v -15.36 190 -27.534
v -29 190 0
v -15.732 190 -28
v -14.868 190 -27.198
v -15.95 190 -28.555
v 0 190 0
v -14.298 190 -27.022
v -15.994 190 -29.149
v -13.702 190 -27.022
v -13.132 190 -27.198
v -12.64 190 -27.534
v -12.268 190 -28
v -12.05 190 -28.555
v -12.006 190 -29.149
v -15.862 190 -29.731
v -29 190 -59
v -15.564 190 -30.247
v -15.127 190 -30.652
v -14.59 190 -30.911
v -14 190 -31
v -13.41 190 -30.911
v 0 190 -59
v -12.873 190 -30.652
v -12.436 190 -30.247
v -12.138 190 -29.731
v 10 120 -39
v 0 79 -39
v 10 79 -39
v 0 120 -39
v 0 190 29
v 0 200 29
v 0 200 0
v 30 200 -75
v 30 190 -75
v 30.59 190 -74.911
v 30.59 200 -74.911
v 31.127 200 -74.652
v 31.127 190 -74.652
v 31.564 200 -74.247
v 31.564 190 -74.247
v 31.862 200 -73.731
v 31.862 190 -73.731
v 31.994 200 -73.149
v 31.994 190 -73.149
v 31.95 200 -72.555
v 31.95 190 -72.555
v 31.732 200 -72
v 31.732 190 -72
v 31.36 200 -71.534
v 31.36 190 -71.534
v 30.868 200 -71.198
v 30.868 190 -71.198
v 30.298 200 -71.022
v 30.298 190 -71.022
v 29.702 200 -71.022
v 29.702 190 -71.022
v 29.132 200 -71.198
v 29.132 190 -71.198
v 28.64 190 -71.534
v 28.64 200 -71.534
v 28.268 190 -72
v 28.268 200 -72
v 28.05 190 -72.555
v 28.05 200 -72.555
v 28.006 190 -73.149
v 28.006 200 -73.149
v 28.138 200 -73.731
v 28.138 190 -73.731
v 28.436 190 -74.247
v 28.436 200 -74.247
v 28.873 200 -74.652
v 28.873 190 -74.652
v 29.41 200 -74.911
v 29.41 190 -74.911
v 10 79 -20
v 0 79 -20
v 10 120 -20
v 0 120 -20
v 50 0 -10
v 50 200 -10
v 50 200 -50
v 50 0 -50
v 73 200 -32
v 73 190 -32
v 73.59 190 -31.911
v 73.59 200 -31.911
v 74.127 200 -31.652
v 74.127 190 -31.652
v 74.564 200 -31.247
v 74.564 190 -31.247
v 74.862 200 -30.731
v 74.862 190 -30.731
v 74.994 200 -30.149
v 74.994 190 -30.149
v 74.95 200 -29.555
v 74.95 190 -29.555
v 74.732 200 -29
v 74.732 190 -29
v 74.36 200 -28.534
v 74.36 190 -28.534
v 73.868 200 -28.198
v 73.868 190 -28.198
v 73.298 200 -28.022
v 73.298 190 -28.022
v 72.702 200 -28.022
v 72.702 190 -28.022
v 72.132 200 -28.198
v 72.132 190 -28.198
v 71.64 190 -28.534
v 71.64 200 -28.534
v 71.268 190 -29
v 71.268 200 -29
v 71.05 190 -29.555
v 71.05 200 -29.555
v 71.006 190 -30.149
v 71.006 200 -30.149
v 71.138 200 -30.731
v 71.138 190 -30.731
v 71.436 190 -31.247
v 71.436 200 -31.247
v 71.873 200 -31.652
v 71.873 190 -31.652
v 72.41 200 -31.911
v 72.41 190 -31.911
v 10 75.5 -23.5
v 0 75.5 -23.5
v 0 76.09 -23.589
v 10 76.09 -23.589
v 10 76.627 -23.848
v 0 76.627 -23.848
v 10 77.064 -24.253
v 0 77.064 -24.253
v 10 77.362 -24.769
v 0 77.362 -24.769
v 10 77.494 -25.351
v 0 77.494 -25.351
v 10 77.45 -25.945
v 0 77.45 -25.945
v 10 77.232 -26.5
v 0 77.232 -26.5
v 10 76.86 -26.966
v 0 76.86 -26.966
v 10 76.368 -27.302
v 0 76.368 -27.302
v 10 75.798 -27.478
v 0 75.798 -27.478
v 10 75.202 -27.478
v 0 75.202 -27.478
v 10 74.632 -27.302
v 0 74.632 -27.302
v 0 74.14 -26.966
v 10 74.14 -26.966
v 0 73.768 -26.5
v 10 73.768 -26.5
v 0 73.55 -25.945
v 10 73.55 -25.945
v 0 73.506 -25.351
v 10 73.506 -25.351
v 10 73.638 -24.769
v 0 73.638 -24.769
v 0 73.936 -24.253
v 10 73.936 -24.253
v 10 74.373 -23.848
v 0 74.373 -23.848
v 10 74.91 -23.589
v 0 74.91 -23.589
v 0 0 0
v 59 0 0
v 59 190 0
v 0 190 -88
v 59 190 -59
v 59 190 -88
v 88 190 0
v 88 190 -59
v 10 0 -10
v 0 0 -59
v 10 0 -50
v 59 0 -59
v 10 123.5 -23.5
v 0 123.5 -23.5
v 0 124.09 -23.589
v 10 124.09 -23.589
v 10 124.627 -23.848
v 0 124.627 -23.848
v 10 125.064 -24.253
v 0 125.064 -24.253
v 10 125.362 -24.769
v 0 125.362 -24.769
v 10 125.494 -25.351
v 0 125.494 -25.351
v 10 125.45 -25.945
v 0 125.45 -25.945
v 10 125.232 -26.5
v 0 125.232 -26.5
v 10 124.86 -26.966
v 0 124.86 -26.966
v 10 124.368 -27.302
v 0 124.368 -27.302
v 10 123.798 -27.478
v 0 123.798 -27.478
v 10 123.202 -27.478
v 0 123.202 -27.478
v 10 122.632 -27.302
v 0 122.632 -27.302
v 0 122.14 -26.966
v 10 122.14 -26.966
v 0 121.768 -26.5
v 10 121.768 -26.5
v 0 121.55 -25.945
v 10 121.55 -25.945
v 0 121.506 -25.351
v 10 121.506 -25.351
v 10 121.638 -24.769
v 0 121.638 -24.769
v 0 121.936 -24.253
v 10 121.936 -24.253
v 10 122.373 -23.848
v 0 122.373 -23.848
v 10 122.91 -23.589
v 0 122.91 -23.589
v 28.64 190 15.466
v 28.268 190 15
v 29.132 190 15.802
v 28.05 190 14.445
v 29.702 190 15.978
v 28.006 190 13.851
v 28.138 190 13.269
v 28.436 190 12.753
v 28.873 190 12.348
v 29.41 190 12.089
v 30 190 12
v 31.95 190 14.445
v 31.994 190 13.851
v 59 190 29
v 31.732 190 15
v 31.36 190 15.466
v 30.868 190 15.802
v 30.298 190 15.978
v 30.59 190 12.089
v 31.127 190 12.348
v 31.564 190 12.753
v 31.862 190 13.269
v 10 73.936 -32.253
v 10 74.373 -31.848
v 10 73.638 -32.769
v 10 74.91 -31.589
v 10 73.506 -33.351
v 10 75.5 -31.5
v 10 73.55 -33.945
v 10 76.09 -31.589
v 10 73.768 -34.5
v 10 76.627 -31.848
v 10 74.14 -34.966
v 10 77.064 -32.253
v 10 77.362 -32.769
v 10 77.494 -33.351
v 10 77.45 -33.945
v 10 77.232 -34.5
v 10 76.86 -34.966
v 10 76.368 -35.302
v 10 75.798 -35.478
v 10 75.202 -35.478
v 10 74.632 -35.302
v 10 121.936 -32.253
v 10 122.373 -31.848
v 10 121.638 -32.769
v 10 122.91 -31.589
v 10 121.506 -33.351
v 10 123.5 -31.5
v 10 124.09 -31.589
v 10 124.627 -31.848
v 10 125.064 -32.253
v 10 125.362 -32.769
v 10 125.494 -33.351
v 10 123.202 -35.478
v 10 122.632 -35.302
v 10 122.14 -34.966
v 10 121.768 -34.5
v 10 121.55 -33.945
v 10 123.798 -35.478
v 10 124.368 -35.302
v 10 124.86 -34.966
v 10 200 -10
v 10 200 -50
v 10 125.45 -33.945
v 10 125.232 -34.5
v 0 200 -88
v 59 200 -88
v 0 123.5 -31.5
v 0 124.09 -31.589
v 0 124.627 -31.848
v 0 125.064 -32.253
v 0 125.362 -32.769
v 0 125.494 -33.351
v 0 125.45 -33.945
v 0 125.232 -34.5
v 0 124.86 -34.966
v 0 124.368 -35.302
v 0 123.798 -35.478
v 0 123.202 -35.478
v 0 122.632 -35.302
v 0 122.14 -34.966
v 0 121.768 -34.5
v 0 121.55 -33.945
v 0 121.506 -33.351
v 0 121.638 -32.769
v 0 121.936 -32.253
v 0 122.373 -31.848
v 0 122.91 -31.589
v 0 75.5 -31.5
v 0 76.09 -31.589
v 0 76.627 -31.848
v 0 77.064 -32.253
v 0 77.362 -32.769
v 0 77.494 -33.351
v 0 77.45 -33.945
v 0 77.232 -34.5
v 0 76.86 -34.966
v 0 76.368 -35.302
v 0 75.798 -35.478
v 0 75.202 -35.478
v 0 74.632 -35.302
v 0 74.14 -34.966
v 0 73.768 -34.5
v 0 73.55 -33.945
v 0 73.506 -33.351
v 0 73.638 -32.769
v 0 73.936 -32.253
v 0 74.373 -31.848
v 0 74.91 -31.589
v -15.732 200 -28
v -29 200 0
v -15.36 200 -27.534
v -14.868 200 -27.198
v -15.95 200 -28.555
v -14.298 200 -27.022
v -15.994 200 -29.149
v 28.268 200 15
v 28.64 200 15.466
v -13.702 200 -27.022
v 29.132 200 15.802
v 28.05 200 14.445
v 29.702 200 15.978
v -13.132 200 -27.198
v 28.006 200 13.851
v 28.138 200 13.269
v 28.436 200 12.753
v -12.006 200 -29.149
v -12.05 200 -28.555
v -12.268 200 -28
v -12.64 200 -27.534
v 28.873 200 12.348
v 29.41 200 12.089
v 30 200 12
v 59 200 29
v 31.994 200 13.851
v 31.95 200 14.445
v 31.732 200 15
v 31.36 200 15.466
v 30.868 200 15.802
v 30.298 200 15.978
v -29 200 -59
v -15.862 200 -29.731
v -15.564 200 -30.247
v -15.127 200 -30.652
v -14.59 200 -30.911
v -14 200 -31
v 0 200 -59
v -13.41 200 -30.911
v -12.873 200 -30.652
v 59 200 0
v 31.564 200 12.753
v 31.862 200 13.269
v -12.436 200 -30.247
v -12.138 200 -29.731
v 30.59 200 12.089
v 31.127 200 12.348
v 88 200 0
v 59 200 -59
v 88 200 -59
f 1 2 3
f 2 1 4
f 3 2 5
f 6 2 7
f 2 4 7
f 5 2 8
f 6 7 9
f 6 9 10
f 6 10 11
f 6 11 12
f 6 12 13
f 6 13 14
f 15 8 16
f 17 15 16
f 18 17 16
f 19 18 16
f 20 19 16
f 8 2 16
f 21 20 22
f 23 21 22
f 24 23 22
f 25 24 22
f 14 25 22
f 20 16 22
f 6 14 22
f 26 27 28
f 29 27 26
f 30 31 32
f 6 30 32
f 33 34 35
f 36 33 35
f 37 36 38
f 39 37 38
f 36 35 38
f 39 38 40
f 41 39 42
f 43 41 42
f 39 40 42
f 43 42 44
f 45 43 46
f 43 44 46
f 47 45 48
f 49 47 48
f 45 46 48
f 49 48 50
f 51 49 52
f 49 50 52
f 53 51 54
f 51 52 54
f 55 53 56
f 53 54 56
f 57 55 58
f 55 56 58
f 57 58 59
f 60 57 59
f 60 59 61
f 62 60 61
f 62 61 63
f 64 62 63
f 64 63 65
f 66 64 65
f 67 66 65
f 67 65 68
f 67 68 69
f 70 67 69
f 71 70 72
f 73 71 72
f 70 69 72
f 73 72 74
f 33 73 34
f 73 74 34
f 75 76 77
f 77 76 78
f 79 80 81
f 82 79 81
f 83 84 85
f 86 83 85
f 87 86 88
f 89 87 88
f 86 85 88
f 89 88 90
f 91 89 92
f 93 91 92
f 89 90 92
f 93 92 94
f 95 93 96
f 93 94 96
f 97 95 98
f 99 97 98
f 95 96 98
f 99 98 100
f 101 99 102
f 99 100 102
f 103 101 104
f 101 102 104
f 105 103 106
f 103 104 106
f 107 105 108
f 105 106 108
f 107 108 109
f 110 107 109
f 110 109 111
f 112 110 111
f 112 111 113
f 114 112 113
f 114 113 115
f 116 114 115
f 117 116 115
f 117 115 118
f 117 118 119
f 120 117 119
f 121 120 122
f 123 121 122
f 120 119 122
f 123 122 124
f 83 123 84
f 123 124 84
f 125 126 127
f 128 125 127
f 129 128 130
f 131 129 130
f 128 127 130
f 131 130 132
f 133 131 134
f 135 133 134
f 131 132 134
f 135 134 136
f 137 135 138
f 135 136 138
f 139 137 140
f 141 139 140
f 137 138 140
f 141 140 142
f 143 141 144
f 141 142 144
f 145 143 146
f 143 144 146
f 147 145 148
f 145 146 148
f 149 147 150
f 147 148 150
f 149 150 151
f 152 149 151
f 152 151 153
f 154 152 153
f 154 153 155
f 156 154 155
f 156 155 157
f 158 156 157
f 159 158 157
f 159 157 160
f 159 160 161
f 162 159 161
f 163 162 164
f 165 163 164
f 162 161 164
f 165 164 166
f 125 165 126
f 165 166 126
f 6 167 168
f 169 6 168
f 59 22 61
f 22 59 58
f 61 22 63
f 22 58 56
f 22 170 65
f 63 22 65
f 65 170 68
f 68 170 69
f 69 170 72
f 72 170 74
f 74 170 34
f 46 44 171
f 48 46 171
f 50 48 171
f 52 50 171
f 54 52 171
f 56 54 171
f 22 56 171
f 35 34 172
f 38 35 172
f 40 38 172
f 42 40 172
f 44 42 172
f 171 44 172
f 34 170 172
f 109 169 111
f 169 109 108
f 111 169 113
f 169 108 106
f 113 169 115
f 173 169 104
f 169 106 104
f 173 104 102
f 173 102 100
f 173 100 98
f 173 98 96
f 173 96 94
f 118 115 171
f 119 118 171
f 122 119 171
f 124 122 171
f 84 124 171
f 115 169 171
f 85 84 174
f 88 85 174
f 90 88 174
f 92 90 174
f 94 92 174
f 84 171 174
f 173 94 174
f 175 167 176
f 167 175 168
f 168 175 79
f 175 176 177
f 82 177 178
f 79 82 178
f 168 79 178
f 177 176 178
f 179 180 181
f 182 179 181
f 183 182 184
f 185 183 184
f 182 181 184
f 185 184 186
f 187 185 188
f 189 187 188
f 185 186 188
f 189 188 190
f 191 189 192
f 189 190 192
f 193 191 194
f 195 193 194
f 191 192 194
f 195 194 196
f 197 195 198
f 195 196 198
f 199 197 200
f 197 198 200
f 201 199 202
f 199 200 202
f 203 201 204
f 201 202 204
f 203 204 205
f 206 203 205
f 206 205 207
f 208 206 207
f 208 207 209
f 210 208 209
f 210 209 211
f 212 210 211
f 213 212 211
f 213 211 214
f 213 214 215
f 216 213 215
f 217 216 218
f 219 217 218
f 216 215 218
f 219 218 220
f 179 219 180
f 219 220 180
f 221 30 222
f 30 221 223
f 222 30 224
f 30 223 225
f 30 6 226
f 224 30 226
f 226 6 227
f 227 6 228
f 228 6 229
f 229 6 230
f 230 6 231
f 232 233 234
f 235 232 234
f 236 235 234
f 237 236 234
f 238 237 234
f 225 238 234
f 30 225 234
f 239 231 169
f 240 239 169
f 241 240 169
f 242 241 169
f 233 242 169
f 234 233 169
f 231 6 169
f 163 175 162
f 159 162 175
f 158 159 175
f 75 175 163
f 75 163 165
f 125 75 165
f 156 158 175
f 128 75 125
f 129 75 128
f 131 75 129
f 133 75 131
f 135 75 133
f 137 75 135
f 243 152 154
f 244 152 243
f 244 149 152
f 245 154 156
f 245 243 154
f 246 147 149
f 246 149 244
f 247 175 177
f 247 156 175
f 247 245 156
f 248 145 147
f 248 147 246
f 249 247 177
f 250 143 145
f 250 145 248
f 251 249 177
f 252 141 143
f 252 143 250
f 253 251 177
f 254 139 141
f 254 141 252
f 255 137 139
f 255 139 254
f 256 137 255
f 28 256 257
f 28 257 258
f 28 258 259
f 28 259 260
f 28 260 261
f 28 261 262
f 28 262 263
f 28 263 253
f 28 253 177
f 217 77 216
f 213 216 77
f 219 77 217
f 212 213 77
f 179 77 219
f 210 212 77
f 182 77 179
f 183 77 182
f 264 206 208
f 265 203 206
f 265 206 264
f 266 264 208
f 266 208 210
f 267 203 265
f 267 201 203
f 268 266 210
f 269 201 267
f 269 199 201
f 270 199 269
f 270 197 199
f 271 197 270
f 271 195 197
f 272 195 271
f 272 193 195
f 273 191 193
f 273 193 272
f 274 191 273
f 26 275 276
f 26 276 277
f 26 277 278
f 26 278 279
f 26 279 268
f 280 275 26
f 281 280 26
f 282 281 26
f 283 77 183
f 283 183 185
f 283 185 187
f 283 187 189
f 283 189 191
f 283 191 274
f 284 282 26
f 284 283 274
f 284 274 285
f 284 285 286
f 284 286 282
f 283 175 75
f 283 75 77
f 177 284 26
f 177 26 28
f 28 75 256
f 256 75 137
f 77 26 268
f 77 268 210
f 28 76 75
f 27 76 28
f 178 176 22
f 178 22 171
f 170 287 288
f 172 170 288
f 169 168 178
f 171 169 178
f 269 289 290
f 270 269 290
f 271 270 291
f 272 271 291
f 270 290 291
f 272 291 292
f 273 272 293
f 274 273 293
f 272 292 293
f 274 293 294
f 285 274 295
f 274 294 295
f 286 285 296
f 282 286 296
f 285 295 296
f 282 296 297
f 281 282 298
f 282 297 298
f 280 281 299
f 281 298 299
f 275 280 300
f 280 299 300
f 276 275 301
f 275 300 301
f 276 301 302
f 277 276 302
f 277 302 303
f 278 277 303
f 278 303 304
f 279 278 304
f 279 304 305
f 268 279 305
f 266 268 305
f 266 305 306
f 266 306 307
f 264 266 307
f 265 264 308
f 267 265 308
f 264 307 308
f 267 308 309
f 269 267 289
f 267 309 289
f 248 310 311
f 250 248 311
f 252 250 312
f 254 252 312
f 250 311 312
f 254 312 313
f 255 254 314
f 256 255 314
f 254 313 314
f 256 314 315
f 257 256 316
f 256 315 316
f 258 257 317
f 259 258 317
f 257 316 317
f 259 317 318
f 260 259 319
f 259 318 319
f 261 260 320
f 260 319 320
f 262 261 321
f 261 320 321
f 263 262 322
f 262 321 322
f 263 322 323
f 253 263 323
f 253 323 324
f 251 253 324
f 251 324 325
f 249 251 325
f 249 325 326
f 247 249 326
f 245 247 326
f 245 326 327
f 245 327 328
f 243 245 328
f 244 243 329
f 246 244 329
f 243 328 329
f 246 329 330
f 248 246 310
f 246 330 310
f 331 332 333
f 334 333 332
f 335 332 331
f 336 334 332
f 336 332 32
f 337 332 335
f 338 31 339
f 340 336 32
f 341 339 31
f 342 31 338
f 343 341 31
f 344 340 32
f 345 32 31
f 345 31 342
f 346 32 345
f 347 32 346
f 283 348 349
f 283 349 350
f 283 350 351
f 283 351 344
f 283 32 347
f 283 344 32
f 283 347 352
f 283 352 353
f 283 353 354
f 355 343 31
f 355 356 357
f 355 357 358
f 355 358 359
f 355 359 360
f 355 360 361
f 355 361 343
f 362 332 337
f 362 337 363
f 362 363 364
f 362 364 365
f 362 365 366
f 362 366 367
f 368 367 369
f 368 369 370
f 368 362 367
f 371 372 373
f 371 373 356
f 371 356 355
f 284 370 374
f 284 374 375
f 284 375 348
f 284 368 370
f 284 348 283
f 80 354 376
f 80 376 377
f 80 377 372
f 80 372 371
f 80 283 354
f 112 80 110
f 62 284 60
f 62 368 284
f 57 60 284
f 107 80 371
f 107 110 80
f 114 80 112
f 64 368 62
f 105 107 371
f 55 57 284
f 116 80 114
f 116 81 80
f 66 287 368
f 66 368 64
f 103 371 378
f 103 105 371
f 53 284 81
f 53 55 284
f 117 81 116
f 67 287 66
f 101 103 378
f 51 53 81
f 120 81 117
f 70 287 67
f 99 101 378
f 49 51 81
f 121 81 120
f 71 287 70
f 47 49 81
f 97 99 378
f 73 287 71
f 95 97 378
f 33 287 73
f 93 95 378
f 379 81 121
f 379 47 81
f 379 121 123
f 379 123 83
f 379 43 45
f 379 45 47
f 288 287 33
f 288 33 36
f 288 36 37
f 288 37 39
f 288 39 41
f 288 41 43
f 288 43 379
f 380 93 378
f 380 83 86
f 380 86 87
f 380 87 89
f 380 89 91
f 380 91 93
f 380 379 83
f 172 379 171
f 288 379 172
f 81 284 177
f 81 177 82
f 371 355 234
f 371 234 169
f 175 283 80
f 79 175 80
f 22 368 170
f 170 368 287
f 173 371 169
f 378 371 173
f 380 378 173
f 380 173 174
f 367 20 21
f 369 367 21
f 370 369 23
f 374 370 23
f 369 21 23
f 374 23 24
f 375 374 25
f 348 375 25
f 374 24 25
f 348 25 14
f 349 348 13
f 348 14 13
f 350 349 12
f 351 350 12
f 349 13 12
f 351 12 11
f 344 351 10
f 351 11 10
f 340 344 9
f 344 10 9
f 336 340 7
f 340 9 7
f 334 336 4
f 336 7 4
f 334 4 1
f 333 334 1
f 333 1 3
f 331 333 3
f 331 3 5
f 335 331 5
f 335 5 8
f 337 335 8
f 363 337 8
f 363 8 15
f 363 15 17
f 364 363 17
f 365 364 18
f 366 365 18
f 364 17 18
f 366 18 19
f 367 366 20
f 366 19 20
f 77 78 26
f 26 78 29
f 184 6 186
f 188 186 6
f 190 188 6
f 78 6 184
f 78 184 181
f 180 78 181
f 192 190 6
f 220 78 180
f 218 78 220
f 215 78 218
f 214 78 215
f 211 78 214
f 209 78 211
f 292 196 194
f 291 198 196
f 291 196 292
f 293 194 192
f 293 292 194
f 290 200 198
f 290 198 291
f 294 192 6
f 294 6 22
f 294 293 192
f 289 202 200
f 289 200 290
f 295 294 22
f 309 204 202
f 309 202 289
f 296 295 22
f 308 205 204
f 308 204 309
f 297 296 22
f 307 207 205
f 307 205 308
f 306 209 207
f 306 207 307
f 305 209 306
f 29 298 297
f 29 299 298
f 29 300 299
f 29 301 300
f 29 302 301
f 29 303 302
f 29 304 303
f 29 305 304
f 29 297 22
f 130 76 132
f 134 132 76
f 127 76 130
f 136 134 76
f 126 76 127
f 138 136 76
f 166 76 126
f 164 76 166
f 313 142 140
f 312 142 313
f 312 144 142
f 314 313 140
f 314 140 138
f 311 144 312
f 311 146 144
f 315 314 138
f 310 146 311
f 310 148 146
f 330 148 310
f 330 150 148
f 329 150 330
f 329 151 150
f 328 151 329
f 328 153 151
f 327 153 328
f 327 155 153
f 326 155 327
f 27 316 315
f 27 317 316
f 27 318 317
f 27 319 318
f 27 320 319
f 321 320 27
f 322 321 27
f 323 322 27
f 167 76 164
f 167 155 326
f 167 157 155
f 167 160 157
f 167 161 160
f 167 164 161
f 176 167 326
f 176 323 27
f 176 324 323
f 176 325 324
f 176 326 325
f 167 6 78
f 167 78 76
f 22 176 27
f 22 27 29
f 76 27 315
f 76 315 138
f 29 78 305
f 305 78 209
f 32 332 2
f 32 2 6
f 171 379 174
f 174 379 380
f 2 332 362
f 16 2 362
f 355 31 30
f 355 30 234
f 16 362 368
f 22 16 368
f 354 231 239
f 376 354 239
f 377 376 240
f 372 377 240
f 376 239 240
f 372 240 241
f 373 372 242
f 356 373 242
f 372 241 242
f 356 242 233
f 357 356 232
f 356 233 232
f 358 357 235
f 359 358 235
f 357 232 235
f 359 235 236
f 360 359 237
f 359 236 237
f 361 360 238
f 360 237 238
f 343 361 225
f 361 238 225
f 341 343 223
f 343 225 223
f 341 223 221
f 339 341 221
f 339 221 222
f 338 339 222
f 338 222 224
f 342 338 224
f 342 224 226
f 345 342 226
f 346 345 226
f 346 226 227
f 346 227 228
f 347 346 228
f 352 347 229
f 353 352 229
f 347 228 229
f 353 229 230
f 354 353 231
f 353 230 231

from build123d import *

# Parameters (mm, degrees)
ESQUISSE1_W             = 59
ESQUISSE1_H             = 59
BOSS_EXTRU_1_DEPTH      = 200
ESQUISSE2_W             = 40
ESQUISSE2_H             = 40
ENL_V_MAT_EXTRU_1_DEPTH = 250
ESQUISSE3_W             = 19
ESQUISSE3_H             = 41
ENL_V_MAT_EXTRU_7_DEPTH = 10
ESQUISSE6_R             = 2
ENL_V_MAT_EXTRU_8_DEPTH = 10
ESQUISSE14_W            = 29
ESQUISSE14_H            = 59
ESQUISSE14_W_2          = 59
ESQUISSE14_H_2          = 29
BOSS_EXTRU_3_DEPTH      = 10
ESQUISSE17_R            = 2
ENL_V_MAT_EXTRU_9_DEPTH = 10


with BuildPart() as part:
    # Esquisse1 → Boss.-Extru.1 (new body)
    with BuildSketch(Plane(origin=(0, 0, 0), x_dir=(1, 0, 0), z_dir=(0, 1, 0))):
        with Locations((29.5, 29.5)):
            Rectangle(ESQUISSE1_W, ESQUISSE1_H)
    extrude(amount=BOSS_EXTRU_1_DEPTH)

    # Esquisse2 → Enlèv. mat.-Extru.1 (cut)
    with BuildSketch(Plane(origin=(0, 200, 0), x_dir=(1, 0, 0), z_dir=(0, 1, 0))):
        with Locations((30, 30)):
            Rectangle(ESQUISSE2_W, ESQUISSE2_H)
    extrude(amount=-ENL_V_MAT_EXTRU_1_DEPTH, mode=Mode.SUBTRACT)

    # Esquisse3 → Enlèv. mat.-Extru.7 (cut)
    with BuildSketch(Plane(origin=(0, 0, 0), x_dir=(0, 0, -1), z_dir=(1, 0, 0))):
        with Locations((29.5, 99.5)):
            Rectangle(ESQUISSE3_W, ESQUISSE3_H)
    extrude(amount=ENL_V_MAT_EXTRU_7_DEPTH, mode=Mode.SUBTRACT)

    # Esquisse6 → Enlèv. mat.-Extru.8 (cut)
    with BuildSketch(Plane.ZY):
        with Locations((-33.5, 123.5)):
            Circle(ESQUISSE6_R)
        with Locations((-25.5, 123.5)):
            Circle(ESQUISSE6_R)
        with Locations((-33.5, 75.5)):
            Circle(ESQUISSE6_R)
        with Locations((-25.5, 75.5)):
            Circle(ESQUISSE6_R)
    extrude(amount=-ENL_V_MAT_EXTRU_8_DEPTH, mode=Mode.SUBTRACT)

    # Esquisse14 → Boss.-Extru.3 (add)
    with BuildSketch(Plane(origin=(0, 200, 0), x_dir=(1, 0, 0), z_dir=(0, 1, 0))):
        with Locations((73.5, 29.5)):
            Rectangle(ESQUISSE14_W, ESQUISSE14_H)
        with Locations((29.5, -14.5)):
            Rectangle(ESQUISSE14_W_2, ESQUISSE14_H_2)
        with Locations((-14.5, 29.5)):
            Rectangle(ESQUISSE14_W, ESQUISSE14_H)
        with Locations((29.5, 73.5)):
            Rectangle(ESQUISSE14_W_2, ESQUISSE14_H_2)
    extrude(amount=-BOSS_EXTRU_3_DEPTH)

    # Esquisse17 → Enlèv. mat.-Extru.9 (cut)
    with BuildSketch(Plane(origin=(0, 190, 0), x_dir=(-1, 0, 0), z_dir=(0, -1, 0))):
        with Locations(Location((-73, 30, 0), (0, 0, 90))):
            Circle(ESQUISSE17_R)
        with Locations(Location((-30, -14, 0), (0, 0, 90))):
            Circle(ESQUISSE17_R)
        with Locations(Location((14, 29, 0), (0, 0, 90))):
            Circle(ESQUISSE17_R)
        with Locations(Location((-30, 73, 0), (0, 0, 90))):
            Circle(ESQUISSE17_R)
    extrude(amount=-ENL_V_MAT_EXTRU_9_DEPTH, mode=Mode.SUBTRACT)


solid = part.part
